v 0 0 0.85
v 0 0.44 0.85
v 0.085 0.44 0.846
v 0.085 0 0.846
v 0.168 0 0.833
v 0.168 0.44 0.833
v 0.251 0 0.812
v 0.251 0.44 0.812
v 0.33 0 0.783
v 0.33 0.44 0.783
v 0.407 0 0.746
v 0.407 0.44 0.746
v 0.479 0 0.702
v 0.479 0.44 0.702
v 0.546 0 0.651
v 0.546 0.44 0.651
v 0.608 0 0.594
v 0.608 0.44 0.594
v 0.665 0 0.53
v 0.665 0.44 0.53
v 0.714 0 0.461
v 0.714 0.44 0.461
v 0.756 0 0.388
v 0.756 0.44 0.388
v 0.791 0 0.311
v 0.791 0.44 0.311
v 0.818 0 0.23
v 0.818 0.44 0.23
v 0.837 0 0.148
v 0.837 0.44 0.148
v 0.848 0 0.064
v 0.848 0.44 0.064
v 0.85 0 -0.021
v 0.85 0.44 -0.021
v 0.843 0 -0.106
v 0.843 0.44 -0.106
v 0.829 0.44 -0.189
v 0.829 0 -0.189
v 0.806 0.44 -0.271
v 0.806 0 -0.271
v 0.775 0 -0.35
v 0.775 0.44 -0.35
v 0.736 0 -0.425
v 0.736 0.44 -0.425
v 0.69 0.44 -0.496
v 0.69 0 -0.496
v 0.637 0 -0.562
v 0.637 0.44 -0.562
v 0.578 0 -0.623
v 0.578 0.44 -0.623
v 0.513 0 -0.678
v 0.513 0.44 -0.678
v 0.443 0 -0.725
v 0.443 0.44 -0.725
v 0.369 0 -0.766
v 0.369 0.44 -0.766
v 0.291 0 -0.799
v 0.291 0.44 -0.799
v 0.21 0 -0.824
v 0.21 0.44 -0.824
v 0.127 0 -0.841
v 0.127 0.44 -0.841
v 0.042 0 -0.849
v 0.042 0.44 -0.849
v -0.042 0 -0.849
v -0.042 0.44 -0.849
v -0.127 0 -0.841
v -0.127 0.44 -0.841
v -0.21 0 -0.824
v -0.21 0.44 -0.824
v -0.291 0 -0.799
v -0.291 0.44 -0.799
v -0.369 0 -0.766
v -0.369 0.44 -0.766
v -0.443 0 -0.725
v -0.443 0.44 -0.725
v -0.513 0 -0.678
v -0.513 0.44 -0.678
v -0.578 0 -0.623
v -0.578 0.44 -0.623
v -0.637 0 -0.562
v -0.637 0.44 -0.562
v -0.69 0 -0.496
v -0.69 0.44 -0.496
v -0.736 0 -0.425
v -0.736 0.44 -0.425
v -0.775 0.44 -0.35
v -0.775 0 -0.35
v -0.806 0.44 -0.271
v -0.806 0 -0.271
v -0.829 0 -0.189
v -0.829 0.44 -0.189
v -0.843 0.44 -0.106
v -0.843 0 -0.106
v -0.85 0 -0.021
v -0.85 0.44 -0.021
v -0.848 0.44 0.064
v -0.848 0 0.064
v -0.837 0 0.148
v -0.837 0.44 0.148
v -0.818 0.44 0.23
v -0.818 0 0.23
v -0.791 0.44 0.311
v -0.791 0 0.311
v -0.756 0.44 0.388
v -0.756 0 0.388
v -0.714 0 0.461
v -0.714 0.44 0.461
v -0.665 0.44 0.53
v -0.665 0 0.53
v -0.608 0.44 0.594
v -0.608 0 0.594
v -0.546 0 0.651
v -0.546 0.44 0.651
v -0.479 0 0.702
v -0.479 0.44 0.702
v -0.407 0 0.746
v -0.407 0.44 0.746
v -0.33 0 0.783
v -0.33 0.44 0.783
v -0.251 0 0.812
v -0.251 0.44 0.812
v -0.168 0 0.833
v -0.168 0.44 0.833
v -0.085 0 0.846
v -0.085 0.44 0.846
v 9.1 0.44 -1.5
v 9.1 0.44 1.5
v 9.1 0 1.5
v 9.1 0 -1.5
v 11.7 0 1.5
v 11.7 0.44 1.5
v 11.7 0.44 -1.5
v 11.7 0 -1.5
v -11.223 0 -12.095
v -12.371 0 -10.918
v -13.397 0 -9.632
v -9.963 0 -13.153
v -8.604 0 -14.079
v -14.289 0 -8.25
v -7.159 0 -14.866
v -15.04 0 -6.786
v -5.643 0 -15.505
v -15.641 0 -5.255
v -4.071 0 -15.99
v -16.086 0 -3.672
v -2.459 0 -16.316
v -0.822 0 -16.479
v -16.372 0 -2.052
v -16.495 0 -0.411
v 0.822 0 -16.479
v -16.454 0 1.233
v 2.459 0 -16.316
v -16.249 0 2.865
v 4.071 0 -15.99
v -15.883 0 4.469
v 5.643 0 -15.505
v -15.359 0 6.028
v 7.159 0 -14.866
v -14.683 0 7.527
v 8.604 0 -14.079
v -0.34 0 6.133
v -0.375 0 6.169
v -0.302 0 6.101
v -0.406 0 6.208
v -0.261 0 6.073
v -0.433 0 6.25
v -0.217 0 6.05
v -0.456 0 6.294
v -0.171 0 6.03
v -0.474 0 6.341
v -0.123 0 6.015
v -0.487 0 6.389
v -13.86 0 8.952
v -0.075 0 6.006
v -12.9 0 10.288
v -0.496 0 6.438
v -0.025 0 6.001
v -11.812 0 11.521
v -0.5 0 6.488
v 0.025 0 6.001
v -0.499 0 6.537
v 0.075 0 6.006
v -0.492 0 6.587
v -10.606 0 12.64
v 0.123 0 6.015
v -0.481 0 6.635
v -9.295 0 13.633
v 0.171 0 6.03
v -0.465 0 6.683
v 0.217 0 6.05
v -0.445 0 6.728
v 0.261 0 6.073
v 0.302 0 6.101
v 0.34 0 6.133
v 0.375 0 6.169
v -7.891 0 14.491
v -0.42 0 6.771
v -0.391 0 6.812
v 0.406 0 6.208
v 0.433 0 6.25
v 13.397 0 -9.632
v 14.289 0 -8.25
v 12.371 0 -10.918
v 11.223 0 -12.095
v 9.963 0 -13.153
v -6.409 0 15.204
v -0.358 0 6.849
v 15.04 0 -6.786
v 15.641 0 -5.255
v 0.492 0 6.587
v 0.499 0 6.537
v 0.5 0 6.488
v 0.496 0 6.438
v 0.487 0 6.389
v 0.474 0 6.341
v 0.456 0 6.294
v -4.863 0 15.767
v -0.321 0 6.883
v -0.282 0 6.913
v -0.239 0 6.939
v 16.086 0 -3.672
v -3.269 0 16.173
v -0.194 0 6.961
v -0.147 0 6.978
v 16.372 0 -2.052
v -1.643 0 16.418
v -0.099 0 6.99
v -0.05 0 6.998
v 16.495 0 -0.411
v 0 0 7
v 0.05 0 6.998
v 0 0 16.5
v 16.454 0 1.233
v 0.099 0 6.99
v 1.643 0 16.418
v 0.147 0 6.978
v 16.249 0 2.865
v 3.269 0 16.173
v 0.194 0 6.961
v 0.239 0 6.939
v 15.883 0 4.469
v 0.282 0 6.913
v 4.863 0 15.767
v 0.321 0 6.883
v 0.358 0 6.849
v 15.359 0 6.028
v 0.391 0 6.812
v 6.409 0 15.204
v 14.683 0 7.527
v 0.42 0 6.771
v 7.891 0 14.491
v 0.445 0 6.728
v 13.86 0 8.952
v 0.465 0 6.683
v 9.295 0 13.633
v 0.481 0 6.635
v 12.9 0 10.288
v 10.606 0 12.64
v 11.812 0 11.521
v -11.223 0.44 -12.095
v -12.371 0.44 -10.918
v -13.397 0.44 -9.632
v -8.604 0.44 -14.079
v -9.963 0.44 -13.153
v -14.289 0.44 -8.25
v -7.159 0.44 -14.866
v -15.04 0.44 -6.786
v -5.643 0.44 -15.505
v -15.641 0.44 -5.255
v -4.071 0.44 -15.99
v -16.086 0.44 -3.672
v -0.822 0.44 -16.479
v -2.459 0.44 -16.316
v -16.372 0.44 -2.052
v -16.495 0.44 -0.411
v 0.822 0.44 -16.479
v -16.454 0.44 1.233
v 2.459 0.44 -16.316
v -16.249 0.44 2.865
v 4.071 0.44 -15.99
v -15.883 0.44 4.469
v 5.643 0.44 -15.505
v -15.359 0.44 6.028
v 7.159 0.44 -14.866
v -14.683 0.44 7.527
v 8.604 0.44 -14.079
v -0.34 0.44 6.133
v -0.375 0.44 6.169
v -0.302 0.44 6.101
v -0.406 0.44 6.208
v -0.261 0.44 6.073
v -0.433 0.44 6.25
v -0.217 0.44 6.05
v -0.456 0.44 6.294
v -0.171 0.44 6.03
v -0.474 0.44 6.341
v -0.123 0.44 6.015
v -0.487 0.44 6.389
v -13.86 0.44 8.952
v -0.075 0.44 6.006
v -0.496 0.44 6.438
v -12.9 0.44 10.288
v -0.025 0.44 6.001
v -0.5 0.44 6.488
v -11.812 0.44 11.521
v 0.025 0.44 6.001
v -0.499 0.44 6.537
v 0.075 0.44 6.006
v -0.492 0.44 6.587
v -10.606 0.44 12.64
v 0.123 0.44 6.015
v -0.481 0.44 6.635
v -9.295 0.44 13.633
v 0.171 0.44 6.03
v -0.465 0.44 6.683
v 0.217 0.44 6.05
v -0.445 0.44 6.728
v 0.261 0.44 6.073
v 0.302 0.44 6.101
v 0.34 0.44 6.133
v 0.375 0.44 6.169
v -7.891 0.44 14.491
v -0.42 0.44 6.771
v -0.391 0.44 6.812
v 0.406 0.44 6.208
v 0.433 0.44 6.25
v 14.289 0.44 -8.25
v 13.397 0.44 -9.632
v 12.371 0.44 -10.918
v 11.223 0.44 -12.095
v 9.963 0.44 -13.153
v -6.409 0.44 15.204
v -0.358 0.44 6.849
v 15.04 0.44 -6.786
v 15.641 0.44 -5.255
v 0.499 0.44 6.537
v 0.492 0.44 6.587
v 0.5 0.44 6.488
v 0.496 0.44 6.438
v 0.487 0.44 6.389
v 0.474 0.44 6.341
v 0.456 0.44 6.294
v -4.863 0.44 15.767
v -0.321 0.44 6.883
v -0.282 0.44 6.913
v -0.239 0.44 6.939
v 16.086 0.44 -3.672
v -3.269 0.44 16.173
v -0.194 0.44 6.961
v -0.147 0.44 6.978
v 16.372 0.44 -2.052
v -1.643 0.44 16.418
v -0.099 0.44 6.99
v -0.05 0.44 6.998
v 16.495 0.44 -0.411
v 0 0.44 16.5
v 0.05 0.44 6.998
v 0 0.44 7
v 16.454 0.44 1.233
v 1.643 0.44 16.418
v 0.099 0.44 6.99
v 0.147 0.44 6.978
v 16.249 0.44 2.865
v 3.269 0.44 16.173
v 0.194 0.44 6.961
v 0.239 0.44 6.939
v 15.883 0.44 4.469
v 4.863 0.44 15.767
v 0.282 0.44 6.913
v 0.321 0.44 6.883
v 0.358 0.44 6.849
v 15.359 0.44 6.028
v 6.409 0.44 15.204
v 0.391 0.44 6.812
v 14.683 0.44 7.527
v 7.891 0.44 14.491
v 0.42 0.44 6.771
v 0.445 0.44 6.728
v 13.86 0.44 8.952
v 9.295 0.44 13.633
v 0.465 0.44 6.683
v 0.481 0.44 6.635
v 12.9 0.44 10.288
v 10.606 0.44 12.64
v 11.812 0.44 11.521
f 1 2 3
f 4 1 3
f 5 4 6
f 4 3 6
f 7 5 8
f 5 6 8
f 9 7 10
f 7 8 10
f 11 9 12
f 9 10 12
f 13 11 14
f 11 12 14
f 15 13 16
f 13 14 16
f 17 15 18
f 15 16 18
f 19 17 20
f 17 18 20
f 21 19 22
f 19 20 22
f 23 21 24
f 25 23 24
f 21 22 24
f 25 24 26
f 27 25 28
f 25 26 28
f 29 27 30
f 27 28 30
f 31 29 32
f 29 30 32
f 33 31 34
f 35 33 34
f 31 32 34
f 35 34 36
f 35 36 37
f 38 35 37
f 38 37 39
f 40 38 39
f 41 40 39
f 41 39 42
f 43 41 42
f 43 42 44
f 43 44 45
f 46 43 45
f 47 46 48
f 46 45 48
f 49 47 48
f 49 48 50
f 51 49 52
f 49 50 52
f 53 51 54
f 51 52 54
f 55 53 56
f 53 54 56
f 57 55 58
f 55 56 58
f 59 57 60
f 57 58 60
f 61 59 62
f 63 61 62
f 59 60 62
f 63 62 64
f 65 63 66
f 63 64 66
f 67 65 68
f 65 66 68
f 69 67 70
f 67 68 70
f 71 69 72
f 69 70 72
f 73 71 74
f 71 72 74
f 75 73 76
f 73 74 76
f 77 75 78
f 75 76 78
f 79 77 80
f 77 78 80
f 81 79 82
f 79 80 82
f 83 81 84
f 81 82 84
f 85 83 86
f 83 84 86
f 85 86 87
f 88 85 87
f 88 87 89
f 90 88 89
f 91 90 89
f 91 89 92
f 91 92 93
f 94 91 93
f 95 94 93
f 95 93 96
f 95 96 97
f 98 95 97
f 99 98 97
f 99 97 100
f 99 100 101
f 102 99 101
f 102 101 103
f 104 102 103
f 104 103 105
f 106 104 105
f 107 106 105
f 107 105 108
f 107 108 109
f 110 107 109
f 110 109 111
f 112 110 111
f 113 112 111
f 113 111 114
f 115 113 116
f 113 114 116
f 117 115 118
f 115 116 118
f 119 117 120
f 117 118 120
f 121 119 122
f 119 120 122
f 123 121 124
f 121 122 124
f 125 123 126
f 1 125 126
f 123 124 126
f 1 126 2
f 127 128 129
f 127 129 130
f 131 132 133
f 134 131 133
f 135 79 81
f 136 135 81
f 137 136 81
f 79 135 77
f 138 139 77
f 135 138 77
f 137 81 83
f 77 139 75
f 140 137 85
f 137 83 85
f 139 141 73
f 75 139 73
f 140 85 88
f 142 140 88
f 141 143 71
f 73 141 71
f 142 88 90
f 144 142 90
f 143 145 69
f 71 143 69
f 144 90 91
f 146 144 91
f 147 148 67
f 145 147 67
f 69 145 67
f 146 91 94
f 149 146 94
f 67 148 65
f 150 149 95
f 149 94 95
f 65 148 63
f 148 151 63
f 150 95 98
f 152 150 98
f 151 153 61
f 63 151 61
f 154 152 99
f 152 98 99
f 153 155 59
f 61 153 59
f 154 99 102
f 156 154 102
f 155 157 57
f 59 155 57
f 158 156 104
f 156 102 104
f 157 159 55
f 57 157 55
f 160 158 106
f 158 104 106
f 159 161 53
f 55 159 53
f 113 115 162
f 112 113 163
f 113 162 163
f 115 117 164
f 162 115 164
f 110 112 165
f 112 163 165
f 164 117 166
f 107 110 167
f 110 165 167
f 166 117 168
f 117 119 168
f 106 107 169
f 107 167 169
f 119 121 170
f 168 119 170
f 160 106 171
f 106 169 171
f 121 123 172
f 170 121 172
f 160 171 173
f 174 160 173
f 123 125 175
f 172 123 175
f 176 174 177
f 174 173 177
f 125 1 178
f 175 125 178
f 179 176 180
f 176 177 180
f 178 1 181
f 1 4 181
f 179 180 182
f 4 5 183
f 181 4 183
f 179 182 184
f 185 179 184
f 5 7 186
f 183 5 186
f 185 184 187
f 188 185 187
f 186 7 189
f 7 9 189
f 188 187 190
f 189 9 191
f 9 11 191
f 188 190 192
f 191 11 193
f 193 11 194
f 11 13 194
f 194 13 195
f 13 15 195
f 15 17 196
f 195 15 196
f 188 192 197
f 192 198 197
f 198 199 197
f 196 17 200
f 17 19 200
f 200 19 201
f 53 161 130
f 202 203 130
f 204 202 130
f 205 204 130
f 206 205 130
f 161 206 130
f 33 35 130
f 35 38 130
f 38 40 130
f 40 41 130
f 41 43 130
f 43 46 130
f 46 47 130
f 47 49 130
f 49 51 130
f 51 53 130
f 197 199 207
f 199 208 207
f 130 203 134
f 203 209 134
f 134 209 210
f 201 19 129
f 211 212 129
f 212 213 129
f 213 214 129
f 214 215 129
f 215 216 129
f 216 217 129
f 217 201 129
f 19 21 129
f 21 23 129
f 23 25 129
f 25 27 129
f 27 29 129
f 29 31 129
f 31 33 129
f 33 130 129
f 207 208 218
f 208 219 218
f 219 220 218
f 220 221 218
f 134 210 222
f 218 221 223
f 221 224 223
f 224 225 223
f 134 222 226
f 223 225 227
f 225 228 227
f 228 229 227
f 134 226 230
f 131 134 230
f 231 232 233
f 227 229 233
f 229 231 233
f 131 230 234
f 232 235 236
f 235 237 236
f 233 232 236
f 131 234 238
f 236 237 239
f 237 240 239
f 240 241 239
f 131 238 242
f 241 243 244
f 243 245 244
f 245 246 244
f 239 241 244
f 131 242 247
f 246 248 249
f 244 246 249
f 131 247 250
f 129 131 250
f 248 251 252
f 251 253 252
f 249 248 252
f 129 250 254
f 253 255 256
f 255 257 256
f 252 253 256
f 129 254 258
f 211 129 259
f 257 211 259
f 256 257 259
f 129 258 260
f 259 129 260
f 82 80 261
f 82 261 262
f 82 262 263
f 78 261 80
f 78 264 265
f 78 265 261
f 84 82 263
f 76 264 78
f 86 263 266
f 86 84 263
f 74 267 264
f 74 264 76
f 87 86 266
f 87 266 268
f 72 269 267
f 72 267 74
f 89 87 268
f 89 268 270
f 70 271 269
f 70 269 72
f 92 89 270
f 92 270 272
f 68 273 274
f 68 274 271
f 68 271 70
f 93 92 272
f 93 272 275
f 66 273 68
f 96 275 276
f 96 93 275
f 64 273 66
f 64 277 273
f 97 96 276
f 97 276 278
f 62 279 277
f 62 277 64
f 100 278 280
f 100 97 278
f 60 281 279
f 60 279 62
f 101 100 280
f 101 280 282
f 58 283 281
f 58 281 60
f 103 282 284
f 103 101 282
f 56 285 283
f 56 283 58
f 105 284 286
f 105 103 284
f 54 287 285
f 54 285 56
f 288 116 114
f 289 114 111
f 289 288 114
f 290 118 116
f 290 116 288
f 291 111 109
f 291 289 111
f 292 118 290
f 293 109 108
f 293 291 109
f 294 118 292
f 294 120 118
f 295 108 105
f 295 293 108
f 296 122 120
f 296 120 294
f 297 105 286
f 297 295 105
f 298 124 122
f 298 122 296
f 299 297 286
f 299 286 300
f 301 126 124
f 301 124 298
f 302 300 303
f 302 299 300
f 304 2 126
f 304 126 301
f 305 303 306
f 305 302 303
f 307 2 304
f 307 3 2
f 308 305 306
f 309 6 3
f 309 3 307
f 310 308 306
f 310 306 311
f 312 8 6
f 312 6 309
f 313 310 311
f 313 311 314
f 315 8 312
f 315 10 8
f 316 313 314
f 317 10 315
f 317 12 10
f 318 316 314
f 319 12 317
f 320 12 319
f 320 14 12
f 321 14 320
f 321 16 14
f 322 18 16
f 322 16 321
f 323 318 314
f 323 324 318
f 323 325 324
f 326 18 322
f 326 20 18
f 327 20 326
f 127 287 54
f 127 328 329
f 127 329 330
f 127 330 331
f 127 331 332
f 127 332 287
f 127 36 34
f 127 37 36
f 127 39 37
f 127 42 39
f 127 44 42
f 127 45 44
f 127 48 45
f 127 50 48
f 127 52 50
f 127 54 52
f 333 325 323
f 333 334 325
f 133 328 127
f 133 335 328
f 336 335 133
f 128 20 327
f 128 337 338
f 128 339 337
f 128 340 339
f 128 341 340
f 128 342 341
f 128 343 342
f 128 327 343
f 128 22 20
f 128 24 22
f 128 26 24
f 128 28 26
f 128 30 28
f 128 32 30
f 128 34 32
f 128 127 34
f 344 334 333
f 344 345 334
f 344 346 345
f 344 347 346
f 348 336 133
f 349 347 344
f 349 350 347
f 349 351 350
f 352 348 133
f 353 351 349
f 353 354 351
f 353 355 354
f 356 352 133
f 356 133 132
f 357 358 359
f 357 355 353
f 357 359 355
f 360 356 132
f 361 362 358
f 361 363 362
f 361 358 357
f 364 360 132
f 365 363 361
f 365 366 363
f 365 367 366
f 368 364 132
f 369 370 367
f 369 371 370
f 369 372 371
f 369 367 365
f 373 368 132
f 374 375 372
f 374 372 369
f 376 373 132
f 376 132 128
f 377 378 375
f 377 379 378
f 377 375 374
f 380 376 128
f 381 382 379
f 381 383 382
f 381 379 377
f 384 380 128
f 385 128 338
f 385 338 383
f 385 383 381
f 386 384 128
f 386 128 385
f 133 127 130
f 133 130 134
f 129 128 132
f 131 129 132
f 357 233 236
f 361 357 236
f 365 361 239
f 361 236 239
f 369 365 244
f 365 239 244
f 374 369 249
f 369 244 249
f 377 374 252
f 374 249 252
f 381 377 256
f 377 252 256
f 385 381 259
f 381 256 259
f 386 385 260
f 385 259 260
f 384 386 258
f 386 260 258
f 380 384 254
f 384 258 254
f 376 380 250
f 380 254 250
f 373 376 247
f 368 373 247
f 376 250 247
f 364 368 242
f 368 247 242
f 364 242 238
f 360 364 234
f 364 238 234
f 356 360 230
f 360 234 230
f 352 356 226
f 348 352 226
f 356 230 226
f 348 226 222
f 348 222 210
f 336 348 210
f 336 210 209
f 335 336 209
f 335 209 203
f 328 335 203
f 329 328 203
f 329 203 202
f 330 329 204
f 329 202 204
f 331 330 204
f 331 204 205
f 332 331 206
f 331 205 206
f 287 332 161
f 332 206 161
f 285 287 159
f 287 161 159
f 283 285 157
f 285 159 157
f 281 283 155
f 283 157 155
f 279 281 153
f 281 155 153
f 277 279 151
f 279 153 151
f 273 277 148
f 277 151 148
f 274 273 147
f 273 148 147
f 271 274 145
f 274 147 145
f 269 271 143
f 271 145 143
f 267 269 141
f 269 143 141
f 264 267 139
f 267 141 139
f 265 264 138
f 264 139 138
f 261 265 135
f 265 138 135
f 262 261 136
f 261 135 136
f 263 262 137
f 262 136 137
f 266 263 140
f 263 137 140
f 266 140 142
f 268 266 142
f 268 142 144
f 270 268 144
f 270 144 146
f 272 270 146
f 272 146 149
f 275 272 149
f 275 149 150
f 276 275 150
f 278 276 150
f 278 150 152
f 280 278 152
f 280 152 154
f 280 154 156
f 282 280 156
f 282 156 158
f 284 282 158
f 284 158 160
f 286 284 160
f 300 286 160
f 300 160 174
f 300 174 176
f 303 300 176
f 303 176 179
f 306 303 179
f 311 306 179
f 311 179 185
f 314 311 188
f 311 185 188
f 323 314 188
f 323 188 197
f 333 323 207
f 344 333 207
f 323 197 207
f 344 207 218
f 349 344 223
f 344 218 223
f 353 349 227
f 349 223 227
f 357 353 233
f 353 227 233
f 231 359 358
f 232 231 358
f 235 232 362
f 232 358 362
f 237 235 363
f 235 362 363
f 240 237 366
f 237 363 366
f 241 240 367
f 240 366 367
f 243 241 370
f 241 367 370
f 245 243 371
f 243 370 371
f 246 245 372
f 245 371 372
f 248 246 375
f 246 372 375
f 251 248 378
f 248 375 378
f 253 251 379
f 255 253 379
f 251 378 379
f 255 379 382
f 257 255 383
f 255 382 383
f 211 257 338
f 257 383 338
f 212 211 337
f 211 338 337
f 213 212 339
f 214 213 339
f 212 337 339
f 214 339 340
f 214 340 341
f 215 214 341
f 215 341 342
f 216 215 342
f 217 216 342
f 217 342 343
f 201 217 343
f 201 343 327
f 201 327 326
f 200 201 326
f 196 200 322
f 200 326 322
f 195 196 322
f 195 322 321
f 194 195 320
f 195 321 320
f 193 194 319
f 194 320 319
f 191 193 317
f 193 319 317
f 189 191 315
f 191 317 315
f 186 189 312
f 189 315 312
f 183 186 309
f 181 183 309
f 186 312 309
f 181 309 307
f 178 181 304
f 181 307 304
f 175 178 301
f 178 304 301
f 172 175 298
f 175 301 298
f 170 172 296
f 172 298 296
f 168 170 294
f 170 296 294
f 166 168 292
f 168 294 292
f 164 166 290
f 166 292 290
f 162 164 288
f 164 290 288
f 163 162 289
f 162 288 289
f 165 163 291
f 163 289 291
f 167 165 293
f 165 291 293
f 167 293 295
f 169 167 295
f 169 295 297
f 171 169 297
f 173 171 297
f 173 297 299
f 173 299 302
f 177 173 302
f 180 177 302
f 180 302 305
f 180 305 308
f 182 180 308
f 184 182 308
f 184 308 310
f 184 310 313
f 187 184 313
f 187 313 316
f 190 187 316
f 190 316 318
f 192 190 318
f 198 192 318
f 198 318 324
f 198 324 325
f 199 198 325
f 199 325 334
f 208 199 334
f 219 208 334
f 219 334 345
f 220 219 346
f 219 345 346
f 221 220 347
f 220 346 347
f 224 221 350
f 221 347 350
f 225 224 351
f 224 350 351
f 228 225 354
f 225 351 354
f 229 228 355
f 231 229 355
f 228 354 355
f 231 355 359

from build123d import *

# Parameters (mm, degrees)
SKETCH1_R           = 16.5
BOSS_EXTRUDE1_DEPTH = 0.44
SKETCH2_R           = 0.85
CUT_EXTRUDE1_DEPTH  = 0.44
SKETCH3_R           = 0.5
SKETCH3_W           = 2.6
SKETCH3_H           = 3
CUT_EXTRUDE4_DEPTH  = 0.44


with BuildPart() as part:
    # Sketch1 → Boss-Extrude1 (new body)
    with BuildSketch(Plane(origin=(0, 0, 0), x_dir=(1, 0, 0), z_dir=(0, 1, 0))):
        with Locations(Location((0, 0, 0), (0, 0, 270))):
            Circle(SKETCH1_R)
    extrude(amount=BOSS_EXTRUDE1_DEPTH)

    # Sketch2 → Cut-Extrude1 (cut)
    with BuildSketch(Plane(origin=(0, 0.44, 0), x_dir=(1, 0, 0), z_dir=(0, 1, 0))):
        with Locations(Location((0, 0, 0), (0, 0, 270))):
            Circle(SKETCH2_R)
    extrude(amount=-CUT_EXTRUDE1_DEPTH, mode=Mode.SUBTRACT)

    # Sketch3 → Cut-Extrude4 (cut)
    with BuildSketch(Plane(origin=(0, 0.44, 0), x_dir=(1, 0, 0), z_dir=(0, 1, 0))):
        with Locations(Location((0, -6.5, 0), (0, 0, 270))):
            Circle(SKETCH3_R)
        with Locations((10.4, 0)):
            Rectangle(SKETCH3_W, SKETCH3_H)
    extrude(amount=-CUT_EXTRUDE4_DEPTH, mode=Mode.SUBTRACT)


solid = part.part
